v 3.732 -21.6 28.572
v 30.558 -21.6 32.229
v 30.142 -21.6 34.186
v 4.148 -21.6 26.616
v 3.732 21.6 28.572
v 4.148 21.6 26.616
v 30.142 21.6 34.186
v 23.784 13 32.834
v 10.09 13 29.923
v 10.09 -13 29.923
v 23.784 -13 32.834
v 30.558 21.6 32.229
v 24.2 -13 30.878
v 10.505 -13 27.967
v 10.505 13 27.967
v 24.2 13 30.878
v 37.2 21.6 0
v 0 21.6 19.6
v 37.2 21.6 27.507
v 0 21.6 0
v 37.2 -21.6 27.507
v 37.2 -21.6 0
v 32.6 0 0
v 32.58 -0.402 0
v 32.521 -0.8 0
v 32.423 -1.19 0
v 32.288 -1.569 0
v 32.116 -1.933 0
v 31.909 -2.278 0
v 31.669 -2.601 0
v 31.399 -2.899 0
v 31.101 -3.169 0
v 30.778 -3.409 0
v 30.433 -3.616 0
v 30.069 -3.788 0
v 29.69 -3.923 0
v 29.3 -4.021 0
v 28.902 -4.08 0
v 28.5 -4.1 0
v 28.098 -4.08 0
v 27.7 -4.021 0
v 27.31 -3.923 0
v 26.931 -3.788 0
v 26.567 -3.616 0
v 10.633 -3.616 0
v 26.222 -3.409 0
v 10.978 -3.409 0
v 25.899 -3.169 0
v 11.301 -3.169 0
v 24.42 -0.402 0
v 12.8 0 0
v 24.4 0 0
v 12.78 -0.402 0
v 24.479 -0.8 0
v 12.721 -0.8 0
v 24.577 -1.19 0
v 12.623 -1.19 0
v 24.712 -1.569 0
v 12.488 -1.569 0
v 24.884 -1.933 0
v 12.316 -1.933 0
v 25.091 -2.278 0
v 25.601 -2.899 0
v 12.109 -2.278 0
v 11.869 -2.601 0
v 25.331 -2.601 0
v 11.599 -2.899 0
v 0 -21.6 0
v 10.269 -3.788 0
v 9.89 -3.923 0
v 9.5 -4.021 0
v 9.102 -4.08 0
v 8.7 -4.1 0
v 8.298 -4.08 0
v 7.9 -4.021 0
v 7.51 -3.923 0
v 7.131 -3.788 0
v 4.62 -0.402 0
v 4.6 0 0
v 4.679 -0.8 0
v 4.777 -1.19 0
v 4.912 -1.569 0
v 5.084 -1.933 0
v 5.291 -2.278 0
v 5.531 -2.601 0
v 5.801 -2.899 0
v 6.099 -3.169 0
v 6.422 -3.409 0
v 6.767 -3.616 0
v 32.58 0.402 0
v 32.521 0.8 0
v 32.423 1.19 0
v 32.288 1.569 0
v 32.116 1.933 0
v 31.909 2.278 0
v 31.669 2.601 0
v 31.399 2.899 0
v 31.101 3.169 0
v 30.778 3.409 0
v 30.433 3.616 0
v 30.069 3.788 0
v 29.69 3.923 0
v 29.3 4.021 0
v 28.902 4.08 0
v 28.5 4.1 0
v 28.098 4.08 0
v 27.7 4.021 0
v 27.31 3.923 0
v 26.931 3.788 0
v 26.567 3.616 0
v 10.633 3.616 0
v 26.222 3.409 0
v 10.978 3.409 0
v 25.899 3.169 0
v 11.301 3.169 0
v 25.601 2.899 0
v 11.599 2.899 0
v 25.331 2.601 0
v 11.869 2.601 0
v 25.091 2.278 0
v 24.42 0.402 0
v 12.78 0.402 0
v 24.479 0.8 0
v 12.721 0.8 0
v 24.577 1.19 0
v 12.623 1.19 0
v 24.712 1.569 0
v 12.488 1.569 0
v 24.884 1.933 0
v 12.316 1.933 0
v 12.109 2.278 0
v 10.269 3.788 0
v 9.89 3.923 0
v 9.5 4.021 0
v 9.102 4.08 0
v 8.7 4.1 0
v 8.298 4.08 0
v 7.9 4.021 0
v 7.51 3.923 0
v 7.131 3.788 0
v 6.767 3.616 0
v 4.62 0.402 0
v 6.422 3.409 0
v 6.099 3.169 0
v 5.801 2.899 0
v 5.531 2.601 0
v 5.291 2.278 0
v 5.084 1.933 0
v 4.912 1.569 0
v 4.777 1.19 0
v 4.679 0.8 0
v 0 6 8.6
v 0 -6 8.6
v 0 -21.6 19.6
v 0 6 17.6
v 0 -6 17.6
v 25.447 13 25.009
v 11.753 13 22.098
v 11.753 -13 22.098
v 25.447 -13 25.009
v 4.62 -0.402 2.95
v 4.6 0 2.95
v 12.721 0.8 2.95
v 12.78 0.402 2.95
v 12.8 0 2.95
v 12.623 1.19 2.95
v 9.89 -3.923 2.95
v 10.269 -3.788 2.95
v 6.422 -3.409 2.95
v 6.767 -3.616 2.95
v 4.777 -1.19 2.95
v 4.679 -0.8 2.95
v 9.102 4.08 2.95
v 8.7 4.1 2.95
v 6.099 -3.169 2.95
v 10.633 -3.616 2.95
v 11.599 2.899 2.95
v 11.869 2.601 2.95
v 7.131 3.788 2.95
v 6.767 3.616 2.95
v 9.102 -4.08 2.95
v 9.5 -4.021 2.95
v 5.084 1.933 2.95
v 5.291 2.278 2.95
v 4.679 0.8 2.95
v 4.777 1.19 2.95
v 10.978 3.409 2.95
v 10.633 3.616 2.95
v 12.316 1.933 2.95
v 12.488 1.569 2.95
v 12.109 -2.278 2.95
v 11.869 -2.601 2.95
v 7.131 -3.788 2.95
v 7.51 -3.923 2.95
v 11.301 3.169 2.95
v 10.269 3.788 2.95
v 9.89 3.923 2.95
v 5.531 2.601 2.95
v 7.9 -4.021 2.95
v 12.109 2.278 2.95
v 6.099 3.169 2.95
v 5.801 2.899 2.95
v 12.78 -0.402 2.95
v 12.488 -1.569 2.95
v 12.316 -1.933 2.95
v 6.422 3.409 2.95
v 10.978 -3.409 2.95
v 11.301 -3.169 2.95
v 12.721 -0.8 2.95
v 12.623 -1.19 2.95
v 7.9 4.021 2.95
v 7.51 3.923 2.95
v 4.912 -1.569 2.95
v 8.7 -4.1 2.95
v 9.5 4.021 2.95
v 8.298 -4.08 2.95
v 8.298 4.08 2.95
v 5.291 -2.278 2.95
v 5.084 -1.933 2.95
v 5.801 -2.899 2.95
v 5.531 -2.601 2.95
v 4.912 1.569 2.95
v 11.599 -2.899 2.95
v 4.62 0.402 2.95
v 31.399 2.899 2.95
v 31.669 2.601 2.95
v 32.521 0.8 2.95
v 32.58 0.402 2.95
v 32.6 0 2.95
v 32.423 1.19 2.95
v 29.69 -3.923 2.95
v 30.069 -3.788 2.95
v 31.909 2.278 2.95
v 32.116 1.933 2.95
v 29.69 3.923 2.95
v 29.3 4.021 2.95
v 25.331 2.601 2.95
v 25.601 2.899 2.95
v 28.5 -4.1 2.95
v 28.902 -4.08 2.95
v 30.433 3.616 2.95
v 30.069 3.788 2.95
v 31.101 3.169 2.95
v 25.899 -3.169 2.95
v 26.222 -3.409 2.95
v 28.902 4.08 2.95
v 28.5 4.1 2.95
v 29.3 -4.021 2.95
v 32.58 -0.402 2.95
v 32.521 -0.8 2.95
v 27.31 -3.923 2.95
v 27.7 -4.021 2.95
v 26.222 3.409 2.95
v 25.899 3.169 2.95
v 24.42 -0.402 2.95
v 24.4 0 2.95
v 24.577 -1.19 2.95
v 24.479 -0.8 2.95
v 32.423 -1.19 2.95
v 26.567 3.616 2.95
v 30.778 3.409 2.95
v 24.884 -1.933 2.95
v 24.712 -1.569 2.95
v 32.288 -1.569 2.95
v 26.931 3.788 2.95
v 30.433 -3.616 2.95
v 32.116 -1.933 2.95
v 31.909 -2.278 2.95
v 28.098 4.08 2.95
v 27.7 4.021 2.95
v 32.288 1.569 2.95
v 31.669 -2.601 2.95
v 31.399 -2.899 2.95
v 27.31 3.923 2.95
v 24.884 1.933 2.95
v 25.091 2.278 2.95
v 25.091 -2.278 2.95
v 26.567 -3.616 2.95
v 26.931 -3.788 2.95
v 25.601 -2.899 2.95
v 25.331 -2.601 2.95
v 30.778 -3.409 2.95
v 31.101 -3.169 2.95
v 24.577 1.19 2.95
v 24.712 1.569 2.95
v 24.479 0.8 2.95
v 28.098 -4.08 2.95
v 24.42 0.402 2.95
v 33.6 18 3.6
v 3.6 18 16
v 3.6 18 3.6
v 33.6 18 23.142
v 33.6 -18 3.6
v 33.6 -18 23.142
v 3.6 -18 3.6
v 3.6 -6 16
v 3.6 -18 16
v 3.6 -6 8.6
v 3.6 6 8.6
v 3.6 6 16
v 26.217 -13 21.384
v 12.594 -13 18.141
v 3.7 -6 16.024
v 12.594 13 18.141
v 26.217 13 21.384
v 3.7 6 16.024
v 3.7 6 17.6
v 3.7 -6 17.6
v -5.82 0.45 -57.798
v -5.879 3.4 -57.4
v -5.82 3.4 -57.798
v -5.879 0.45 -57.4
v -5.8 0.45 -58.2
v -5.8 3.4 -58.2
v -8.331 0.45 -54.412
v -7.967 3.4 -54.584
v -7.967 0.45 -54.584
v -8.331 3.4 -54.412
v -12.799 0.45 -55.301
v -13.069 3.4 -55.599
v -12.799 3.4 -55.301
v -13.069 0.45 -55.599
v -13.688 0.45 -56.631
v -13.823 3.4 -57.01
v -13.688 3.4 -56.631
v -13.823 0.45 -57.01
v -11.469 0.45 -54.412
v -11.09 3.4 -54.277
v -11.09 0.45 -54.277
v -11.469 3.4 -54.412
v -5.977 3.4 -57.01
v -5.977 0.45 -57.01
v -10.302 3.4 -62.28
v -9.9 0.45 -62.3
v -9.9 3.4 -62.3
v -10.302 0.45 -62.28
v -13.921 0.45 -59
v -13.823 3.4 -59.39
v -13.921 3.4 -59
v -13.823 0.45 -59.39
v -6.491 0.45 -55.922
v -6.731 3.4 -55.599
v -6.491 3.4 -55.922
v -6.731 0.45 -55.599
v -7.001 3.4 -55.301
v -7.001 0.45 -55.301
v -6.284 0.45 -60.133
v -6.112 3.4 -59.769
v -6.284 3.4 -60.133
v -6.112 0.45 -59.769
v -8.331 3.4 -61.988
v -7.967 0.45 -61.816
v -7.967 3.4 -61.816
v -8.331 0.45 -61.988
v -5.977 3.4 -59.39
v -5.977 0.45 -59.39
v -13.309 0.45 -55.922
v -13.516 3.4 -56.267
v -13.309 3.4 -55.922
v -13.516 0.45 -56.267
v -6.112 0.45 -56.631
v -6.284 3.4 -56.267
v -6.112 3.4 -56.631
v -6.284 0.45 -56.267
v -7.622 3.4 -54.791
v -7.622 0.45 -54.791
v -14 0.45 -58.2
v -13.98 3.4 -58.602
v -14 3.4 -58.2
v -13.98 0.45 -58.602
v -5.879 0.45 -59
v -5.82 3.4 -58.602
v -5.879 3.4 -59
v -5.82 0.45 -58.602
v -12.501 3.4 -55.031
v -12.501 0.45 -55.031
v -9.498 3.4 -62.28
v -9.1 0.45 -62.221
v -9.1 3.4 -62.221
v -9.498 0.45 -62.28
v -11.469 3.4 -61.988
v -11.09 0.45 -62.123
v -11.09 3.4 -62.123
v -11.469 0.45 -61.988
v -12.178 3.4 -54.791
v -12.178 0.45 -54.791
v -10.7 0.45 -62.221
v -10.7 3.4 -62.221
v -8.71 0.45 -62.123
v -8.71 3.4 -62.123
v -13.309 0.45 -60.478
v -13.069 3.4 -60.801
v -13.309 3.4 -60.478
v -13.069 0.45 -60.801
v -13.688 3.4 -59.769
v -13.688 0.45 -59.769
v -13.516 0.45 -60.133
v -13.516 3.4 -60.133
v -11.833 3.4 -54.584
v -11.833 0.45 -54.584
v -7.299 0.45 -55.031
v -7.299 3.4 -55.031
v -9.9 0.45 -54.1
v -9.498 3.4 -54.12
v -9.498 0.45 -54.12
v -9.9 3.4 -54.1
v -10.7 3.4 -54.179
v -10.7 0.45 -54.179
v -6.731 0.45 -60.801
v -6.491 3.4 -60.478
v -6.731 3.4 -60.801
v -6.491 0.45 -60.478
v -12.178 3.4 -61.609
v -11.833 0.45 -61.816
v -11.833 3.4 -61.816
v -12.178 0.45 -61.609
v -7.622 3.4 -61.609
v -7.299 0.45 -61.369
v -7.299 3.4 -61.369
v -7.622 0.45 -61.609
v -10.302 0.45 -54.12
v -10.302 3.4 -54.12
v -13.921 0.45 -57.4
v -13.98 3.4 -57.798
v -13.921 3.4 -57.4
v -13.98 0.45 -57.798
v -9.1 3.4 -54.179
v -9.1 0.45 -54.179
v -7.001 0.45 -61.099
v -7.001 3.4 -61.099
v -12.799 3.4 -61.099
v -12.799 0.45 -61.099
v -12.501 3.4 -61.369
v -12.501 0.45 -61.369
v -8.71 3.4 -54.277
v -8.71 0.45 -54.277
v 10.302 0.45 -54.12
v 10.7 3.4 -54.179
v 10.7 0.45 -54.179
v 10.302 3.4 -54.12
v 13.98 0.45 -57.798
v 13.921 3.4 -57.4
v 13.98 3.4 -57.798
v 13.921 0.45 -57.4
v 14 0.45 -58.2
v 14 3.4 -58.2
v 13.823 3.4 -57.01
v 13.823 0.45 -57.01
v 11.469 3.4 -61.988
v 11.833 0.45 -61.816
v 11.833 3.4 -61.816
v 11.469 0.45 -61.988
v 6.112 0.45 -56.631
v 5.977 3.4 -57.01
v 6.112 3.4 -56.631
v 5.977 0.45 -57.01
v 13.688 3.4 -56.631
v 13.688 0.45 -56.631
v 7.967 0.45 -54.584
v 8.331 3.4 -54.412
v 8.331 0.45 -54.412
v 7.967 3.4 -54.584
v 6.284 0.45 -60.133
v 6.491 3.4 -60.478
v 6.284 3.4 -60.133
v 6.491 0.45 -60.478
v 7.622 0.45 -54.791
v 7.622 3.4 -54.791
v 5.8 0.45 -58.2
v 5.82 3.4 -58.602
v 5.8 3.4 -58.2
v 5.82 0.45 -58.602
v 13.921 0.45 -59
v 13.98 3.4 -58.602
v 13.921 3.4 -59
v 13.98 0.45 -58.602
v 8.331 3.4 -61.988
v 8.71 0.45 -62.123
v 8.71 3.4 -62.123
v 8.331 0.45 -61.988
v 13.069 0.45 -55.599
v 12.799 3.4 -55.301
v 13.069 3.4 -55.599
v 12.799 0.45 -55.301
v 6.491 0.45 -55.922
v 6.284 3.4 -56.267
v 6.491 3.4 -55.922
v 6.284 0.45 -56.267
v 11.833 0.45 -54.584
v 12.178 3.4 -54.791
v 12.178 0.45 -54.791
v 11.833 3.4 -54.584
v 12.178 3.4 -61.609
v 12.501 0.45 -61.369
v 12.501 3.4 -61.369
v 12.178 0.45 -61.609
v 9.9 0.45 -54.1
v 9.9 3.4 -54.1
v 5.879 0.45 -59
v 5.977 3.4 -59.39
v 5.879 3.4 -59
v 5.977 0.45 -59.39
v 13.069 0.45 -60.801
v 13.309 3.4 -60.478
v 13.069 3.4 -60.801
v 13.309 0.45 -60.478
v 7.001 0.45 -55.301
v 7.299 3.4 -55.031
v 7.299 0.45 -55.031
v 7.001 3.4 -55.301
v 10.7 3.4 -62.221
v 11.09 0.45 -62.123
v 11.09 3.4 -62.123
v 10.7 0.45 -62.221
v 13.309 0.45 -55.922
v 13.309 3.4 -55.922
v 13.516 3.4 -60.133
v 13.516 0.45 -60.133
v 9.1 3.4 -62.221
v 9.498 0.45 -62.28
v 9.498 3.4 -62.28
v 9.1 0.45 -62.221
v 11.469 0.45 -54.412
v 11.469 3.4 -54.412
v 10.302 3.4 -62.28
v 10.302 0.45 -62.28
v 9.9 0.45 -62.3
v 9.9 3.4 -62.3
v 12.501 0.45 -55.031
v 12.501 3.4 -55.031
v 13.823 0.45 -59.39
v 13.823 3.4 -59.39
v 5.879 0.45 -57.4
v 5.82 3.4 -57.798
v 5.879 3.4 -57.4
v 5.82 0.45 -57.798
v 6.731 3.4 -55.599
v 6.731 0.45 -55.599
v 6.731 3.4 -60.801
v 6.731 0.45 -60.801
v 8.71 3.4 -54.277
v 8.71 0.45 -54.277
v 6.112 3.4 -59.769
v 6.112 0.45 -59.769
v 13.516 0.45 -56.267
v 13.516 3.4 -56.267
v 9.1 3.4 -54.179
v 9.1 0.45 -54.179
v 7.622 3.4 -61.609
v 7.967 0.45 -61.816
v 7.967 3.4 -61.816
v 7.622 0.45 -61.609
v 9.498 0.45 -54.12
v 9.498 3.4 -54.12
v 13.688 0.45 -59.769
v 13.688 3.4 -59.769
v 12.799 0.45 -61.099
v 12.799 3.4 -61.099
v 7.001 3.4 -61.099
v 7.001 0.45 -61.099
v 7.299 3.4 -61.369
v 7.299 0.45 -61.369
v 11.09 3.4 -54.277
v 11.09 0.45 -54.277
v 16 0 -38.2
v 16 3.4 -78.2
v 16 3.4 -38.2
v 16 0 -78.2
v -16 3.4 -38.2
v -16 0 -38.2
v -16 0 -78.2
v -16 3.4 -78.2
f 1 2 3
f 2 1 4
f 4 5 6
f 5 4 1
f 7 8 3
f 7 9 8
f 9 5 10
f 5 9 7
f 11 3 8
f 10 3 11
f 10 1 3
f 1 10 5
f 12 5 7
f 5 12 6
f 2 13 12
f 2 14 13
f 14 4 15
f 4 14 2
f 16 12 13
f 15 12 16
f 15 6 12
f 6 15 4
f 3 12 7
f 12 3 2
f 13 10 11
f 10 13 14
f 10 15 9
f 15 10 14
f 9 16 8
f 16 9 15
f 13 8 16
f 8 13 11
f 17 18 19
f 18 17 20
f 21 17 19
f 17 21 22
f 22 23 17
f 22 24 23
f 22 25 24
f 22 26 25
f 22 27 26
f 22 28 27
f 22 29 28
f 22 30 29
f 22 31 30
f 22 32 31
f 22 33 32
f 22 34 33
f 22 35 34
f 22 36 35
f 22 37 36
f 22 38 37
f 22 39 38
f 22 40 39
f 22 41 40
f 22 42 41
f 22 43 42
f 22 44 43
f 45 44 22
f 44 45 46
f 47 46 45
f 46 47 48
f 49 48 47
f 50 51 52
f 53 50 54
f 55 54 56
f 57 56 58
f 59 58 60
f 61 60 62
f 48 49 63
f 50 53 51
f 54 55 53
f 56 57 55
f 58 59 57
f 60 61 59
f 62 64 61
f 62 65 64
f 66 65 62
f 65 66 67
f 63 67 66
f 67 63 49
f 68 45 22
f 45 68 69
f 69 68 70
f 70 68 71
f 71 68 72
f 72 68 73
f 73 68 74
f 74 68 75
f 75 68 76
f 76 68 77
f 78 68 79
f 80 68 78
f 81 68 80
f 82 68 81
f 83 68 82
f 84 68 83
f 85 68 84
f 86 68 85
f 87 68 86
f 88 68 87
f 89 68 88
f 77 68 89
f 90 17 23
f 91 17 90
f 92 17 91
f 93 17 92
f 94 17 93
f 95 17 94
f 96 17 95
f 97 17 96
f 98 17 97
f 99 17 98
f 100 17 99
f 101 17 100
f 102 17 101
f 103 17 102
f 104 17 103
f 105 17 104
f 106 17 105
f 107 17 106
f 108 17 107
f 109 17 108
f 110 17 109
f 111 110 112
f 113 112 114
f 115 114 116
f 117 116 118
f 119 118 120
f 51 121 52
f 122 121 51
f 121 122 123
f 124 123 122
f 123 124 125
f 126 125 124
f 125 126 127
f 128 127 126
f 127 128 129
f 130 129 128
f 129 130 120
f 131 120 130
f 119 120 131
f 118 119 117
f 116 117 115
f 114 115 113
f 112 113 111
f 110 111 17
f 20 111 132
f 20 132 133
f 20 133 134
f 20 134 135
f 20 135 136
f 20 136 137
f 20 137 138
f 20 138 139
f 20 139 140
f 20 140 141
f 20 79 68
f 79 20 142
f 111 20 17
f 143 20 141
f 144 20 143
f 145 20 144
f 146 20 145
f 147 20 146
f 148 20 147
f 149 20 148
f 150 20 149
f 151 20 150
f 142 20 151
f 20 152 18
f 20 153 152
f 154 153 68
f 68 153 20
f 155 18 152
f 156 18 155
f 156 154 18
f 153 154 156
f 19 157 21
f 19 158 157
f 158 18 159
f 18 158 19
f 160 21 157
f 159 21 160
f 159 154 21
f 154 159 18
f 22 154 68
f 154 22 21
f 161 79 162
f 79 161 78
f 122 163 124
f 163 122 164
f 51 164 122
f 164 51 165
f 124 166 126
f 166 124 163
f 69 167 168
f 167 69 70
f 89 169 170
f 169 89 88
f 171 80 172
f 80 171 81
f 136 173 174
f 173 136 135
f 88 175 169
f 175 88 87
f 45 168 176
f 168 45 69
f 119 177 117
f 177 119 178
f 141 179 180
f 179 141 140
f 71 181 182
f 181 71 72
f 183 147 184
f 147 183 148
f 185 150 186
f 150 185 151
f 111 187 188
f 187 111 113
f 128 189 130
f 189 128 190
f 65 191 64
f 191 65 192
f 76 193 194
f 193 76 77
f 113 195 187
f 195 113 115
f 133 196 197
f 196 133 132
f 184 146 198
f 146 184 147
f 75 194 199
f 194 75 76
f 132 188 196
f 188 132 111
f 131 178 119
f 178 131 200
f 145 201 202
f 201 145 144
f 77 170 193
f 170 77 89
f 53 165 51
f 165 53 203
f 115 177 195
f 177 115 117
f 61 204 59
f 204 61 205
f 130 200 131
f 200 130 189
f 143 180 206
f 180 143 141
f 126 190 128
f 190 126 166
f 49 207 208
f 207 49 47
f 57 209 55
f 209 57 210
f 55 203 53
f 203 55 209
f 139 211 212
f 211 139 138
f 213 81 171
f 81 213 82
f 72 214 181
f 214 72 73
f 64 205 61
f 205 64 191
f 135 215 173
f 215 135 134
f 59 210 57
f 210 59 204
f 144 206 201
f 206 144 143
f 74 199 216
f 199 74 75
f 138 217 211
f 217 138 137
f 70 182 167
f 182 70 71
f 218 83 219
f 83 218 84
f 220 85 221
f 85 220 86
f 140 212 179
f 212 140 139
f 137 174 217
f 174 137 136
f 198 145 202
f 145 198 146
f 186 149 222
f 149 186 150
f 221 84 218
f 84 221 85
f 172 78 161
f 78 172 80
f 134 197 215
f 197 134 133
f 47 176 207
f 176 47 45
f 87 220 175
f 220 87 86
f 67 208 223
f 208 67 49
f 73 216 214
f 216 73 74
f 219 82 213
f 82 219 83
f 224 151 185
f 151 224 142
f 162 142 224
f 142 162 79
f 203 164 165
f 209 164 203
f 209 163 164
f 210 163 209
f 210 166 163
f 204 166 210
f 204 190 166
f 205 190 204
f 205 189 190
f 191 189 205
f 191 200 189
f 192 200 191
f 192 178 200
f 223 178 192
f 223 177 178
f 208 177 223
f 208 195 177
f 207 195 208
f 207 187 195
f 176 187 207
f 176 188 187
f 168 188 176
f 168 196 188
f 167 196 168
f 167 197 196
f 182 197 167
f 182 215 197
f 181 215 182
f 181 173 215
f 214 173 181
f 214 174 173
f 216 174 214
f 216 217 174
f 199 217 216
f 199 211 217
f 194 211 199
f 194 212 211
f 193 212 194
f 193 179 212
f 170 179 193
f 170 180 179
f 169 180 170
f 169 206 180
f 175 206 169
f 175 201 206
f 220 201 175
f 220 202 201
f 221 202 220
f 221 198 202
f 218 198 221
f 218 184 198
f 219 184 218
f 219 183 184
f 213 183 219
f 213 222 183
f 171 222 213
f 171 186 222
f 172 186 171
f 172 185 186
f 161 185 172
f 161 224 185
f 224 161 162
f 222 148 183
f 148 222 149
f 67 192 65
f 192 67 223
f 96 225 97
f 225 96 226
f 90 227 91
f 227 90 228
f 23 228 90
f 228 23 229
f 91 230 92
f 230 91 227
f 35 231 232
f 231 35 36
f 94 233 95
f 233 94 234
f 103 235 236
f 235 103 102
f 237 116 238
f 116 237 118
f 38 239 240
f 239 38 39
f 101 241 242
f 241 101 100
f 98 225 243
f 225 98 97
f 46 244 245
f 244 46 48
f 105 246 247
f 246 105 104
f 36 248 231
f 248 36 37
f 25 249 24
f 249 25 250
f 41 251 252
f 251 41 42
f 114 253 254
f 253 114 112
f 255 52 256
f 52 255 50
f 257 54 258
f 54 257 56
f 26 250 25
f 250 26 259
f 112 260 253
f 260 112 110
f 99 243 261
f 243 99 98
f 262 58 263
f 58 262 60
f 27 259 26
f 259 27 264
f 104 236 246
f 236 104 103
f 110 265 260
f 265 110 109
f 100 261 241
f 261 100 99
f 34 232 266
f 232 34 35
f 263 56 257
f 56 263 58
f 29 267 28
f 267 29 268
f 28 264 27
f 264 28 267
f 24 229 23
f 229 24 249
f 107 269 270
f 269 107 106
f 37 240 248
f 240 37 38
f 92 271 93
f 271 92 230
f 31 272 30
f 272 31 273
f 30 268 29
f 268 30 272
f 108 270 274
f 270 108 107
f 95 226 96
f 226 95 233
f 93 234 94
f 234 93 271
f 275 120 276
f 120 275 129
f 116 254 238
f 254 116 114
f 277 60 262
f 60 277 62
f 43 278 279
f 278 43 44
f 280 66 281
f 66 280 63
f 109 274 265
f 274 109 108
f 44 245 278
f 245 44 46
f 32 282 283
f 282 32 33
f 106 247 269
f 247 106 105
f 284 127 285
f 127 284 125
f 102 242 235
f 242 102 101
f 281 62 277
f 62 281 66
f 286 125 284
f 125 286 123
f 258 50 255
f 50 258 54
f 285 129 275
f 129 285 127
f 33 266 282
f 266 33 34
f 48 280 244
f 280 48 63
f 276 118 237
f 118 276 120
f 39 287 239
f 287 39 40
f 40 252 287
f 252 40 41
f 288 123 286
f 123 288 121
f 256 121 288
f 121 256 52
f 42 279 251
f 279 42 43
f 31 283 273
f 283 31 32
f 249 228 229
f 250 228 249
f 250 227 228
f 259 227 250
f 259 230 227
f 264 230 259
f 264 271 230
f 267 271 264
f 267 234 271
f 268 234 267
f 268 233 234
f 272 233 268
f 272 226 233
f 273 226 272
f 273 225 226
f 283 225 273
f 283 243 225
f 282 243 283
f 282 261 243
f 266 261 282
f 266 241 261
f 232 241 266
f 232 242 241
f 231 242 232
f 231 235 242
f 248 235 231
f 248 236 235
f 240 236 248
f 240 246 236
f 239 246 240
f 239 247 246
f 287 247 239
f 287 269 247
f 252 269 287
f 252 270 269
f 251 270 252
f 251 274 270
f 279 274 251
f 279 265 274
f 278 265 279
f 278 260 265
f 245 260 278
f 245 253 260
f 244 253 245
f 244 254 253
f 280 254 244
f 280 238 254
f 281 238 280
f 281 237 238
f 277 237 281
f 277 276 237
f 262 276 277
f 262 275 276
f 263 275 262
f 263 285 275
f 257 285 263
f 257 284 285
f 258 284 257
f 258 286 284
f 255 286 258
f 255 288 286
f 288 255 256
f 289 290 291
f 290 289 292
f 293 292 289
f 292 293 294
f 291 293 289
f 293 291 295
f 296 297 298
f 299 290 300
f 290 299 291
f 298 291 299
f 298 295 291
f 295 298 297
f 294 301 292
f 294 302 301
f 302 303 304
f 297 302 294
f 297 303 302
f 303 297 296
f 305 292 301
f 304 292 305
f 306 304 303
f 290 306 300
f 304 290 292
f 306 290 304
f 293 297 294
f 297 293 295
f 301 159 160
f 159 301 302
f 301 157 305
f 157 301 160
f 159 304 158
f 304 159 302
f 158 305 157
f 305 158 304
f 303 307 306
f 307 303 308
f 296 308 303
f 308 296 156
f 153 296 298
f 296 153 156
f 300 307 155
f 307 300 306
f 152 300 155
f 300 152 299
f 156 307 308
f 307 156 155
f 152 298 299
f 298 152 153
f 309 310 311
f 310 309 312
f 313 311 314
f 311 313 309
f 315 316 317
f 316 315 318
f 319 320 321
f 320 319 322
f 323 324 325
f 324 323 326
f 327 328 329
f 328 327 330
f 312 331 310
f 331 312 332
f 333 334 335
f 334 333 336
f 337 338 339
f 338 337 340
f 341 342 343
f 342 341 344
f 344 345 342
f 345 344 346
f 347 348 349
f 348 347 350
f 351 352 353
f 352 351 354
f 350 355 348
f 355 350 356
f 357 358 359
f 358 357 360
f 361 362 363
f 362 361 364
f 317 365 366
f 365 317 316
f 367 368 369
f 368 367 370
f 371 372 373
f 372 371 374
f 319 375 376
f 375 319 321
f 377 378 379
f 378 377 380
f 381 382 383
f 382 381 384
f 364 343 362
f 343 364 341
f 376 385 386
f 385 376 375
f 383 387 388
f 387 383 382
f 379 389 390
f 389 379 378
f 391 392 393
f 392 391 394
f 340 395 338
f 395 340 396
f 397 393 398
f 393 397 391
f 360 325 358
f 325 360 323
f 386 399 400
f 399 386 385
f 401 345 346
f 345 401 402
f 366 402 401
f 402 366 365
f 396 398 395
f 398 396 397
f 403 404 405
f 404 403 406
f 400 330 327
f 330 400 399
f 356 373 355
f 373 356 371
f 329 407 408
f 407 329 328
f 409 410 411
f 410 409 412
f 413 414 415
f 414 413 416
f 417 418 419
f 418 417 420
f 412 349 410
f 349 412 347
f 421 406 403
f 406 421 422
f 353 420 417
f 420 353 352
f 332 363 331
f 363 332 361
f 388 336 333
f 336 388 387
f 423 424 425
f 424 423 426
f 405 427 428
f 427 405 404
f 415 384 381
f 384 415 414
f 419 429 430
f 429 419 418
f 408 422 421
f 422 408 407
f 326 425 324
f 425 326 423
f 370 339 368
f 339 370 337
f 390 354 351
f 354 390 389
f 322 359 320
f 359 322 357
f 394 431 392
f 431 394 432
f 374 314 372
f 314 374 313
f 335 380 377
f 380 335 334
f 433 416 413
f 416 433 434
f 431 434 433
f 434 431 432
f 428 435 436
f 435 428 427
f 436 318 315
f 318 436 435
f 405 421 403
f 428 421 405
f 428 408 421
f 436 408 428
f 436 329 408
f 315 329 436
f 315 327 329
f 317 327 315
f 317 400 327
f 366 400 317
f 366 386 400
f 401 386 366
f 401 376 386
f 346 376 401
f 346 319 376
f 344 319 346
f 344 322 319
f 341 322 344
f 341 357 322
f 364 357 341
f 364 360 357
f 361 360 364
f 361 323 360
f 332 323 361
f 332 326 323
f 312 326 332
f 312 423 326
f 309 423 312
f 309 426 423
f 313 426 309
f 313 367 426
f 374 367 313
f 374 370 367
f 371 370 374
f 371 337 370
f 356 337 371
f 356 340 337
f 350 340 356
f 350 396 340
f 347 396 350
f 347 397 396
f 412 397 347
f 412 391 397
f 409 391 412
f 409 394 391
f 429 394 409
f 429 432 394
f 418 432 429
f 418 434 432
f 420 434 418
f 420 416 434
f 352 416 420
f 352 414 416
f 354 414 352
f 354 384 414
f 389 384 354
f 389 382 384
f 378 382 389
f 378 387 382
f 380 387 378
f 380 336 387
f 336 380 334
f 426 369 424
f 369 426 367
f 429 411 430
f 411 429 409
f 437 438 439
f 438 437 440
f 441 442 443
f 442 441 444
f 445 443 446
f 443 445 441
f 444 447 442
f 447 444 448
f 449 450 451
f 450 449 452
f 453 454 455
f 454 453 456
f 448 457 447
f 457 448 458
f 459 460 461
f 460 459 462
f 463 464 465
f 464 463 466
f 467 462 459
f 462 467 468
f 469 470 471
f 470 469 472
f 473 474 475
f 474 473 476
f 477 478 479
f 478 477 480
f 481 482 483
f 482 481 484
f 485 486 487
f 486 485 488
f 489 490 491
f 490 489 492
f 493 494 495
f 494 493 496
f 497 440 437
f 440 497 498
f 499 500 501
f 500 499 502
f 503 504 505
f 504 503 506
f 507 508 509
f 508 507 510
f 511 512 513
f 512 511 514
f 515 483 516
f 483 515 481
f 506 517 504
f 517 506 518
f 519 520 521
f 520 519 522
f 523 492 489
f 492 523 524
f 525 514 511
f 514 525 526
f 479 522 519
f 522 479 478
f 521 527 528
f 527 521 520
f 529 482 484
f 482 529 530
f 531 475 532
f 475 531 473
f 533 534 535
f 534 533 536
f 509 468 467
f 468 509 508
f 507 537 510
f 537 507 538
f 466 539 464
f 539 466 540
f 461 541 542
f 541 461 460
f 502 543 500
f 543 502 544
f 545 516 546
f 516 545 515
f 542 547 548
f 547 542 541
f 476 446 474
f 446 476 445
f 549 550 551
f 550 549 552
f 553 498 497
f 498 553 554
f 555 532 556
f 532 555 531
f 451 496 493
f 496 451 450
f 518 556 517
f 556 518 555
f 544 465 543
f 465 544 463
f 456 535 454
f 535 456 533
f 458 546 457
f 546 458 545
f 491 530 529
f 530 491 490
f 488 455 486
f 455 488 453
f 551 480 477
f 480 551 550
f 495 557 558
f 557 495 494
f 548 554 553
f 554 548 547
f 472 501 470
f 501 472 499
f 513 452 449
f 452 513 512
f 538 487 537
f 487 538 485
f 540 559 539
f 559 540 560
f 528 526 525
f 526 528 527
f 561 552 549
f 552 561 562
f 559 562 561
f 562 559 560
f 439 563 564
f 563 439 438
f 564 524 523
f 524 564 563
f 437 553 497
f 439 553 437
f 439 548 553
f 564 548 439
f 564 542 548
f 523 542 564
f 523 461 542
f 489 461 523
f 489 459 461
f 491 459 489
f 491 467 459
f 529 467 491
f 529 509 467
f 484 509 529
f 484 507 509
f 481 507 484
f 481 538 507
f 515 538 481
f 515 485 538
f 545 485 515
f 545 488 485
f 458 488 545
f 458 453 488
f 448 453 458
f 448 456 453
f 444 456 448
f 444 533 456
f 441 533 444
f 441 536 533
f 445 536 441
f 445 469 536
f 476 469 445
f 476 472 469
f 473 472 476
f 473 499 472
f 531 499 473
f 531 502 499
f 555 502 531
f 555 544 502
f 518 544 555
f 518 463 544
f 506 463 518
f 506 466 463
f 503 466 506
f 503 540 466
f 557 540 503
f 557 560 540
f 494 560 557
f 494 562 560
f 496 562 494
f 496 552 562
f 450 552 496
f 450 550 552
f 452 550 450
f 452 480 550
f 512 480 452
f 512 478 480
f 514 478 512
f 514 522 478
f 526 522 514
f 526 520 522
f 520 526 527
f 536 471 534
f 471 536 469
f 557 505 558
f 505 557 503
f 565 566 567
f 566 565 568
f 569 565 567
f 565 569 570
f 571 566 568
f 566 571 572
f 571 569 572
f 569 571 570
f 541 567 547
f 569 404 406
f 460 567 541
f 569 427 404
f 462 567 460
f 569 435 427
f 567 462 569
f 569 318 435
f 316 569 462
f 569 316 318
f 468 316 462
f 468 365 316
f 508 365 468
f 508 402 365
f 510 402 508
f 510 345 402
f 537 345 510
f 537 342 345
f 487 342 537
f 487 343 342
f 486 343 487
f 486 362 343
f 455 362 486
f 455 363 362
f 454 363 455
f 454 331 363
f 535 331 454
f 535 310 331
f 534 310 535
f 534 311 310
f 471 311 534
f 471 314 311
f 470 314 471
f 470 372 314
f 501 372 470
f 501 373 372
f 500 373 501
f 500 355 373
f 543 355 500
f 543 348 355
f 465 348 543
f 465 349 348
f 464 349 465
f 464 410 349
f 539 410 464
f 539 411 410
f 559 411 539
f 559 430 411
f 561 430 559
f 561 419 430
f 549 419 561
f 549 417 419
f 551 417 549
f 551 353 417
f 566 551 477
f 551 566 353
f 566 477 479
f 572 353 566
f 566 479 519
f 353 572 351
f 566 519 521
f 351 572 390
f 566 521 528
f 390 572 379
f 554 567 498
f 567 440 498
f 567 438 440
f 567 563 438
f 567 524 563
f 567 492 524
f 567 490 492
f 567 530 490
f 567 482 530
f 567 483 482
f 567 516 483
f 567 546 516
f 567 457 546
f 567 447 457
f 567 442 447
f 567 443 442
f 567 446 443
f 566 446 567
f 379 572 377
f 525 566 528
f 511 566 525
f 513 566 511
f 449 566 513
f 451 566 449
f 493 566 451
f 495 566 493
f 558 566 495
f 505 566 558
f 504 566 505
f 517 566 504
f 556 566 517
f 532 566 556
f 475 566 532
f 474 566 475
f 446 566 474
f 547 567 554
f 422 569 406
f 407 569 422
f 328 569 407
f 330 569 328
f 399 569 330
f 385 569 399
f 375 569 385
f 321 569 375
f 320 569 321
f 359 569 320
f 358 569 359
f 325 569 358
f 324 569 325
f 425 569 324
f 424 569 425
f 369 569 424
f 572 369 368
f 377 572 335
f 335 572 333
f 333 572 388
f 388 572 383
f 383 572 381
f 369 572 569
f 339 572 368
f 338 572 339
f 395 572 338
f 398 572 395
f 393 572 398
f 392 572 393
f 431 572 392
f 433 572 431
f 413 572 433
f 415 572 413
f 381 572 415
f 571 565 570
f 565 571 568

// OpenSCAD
// Aroma Shot Timer — display pod casing (v2, complete redesign)
//
// Construction: ONE consistent coordinate frame throughout.
//   Profile frame: x = height, y = depth, z = width.
//     - Back face (mount plane): the plane y = 0, flat and vertical.
//     - Bottom face: the plane x = 0.
//     - Front face: tilted by tilt_deg, leaning OUT at the top.
//   The final render applies rotate([90,0,0]) so the flat back face
//   lies on the print bed — that is the intended print orientation,
//   no supports needed (12 deg overhang).
//
// Mounting: magnetic. Two 8x3mm magnets in the pod's back face grab
// two counterpart magnets (or steel washers) set into a separate
// backing plate that is stuck to the machine with VHB tape.
//
// Part 2 of this file renders the backing plate.

// ---------------- Parameters ----------------
wall      = 3.6;    // wall thickness (thick enough for blind magnet pockets)
inner_h   = 30;     // cavity height — must fit the 27mm OLED PCB upright
inner_d   = 16;     // cavity depth: OLED + ESP32 + wiring behind the seat plate
inner_w   = 36;     // cavity width — PCB 27mm sits with margin
tilt_deg  = 12;     // front face tilt: top leans toward the viewer

// OLED (0.96" SSD1306 module, 27x27mm PCB, mounted parallel to front face)
oled_pcb    = 27.0;
oled_view_w = 24.0;   // window width  (measure your module's glass!)
oled_view_h = 12.0;   // window height (glass is ~11mm tall at size-3 text)
oled_seat   = 2.4;    // gap between inner front face and the seat plate (PCB thickness + slop)
plate_t     = 2.0;    // seat plate thickness

// Magnets: 8x3mm neodymium discs
magnet_d = 8.2;
magnet_t = 3.0;

// Backing plate (Part 2)
bp_h = 32;           // plate height (x)
bp_w = 40;           // plate width  (z)
bp_t = 3.4;          // plate thickness

$fn = 64;

// ---------------- Derived ----------------
shift   = tan(tilt_deg);            // front lean per unit height
outer_h = inner_h + 2*wall;
outer_d = inner_d + wall;          // front wall counted via the offset below
front_shift = shift * outer_h;     // how far the top front edge leans out
L  = sqrt(outer_h*outer_h + front_shift*front_shift); // front face length

// ---------------- Pod body ----------------
// Extruded side profile: x = height (0..outer_h), y = depth (0..outer_d).
module pod_profile() {
  polygon([
    [0, 0],                         // back-bottom
    [outer_h, 0],                   // back-top
    [outer_h, outer_d + front_shift],  // front-top (tilted out)
    [0, outer_d],                   // front-bottom
  ]);
}

module cavity_profile() {
  // Inner front face = outer front face offset inward by `wall`
  // (exactly parallel: same slope, shifted by wall in -y).
  polygon([
    [wall, wall],
    [outer_h - wall, wall],
    [outer_h - wall, inner_d + front_shift*(outer_h - wall)/outer_h],
    [wall, inner_d],
  ]);
}

module pod_body() {
  difference() {
    union() {
      translate([0, 0, -inner_w/2 - wall])
        linear_extrude(inner_w + 2*wall) pod_profile();
      oled_seat_plate();
    }
    translate([0, 0, -inner_w/2])
      linear_extrude(inner_w) cavity_profile();
    window_cut();
    magnet_pockets();
    usb_slot();
  }
}

// ---------------- Front-face helpers ----------------
// All front-face features share this transform: a point on the face at
// height xh, offset inward along the face normal by `off`.
// Outward face normal (profile frame): (sin(tilt), -cos(tilt)) i.e. the
// front face leans out, so inward = (-sin, +cos) direction.
module on_front(xh, off) {
  ang = tilt_deg;
  y_face = outer_d + front_shift * xh / outer_h;
  nx = -sin(ang);   // inward normal, x component
  ny = cos(ang);    // inward normal, y component
  translate([xh + nx*off, y_face + ny*off, 0])
    rotate([0, 0, ang])
      children();
}

// Window: rectangular cut through the front wall, along the face normal.
// Cube is thin in local y (depth); rotate([0,0,tilt]) aligns its -y face
// with the outward face normal.
module window_cut() {
  on_front(outer_h/2, 0)
    cube([oled_view_h + 2, 2*wall + 4, oled_view_w + 2], center = true);
}

// OLED seat plate: a full-width plate `oled_seat` behind the inner front
// face, with a window-sized hole. The PCB slides into the gap between
// plate and front wall, glass toward the window. The plate spans the
// full cavity width PLUS 2*wall so it fuses into the side walls —
// no floating parts.
module oled_seat_plate() {
  difference() {
    on_front(outer_h/2, wall + oled_seat + plate_t/2)
      cube([oled_pcb, plate_t, inner_w + 2*wall], center = true);
    on_front(outer_h/2, wall + oled_seat + plate_t/2)
      cube([oled_view_h + 2, plate_t + 4, oled_view_w + 2], center = true);
  }
}

// ---------------- Back-face mount features ----------------
// Blind magnet pockets drilled into the back face (y = 0 plane),
// axis along +y. Pocket depth < wall, so a floor remains.
module magnet_pockets() {
  for (mx = [wall + magnet_d/2 + 1, outer_h - wall - magnet_d/2 - 1])
    translate([mx, -0.05, 0])
      rotate([-90, 0, 0])
        cylinder(d = magnet_d, h = magnet_t);
}

// USB-C cable slot through the bottom face (x = 0 plane), near the front.
module usb_slot() {
  translate([-0.1, outer_d - 11, -6])
    cube([wall + 0.2, 9, 12]);
}

// ---------------- Part 2: backing plate ----------------
// Sticks to the machine with VHB tape; holds the counterpart magnets
// (or steel washers) that the pod grabs. Same magnet x-spacing as the pod.
module backing_plate() {
  difference() {
    translate([-bp_h/2, 0, -bp_w/2]) cube([bp_h, bp_t, bp_w]);
    for (mx = [wall + magnet_d/2 + 1 - outer_h/2, outer_h/2 - wall - magnet_d/2 - 1])
      translate([mx, bp_t + 0.05, 0])
        rotate([90, 0, 0])
          cylinder(d = magnet_d, h = magnet_t);
  }
}

// ---------------- Render (print orientation) ----------------
// rotate([90,0,0]) puts the pod's flat back face (y=0) onto the bed (z=0):
// the tilted front face points up at 12 deg — printable without supports.
// The backing plate prints flat beside it.
rotate([90, 0, 0]) pod_body();
translate([0, 0, -(inner_w + 2*wall) - 15]) backing_plate();
